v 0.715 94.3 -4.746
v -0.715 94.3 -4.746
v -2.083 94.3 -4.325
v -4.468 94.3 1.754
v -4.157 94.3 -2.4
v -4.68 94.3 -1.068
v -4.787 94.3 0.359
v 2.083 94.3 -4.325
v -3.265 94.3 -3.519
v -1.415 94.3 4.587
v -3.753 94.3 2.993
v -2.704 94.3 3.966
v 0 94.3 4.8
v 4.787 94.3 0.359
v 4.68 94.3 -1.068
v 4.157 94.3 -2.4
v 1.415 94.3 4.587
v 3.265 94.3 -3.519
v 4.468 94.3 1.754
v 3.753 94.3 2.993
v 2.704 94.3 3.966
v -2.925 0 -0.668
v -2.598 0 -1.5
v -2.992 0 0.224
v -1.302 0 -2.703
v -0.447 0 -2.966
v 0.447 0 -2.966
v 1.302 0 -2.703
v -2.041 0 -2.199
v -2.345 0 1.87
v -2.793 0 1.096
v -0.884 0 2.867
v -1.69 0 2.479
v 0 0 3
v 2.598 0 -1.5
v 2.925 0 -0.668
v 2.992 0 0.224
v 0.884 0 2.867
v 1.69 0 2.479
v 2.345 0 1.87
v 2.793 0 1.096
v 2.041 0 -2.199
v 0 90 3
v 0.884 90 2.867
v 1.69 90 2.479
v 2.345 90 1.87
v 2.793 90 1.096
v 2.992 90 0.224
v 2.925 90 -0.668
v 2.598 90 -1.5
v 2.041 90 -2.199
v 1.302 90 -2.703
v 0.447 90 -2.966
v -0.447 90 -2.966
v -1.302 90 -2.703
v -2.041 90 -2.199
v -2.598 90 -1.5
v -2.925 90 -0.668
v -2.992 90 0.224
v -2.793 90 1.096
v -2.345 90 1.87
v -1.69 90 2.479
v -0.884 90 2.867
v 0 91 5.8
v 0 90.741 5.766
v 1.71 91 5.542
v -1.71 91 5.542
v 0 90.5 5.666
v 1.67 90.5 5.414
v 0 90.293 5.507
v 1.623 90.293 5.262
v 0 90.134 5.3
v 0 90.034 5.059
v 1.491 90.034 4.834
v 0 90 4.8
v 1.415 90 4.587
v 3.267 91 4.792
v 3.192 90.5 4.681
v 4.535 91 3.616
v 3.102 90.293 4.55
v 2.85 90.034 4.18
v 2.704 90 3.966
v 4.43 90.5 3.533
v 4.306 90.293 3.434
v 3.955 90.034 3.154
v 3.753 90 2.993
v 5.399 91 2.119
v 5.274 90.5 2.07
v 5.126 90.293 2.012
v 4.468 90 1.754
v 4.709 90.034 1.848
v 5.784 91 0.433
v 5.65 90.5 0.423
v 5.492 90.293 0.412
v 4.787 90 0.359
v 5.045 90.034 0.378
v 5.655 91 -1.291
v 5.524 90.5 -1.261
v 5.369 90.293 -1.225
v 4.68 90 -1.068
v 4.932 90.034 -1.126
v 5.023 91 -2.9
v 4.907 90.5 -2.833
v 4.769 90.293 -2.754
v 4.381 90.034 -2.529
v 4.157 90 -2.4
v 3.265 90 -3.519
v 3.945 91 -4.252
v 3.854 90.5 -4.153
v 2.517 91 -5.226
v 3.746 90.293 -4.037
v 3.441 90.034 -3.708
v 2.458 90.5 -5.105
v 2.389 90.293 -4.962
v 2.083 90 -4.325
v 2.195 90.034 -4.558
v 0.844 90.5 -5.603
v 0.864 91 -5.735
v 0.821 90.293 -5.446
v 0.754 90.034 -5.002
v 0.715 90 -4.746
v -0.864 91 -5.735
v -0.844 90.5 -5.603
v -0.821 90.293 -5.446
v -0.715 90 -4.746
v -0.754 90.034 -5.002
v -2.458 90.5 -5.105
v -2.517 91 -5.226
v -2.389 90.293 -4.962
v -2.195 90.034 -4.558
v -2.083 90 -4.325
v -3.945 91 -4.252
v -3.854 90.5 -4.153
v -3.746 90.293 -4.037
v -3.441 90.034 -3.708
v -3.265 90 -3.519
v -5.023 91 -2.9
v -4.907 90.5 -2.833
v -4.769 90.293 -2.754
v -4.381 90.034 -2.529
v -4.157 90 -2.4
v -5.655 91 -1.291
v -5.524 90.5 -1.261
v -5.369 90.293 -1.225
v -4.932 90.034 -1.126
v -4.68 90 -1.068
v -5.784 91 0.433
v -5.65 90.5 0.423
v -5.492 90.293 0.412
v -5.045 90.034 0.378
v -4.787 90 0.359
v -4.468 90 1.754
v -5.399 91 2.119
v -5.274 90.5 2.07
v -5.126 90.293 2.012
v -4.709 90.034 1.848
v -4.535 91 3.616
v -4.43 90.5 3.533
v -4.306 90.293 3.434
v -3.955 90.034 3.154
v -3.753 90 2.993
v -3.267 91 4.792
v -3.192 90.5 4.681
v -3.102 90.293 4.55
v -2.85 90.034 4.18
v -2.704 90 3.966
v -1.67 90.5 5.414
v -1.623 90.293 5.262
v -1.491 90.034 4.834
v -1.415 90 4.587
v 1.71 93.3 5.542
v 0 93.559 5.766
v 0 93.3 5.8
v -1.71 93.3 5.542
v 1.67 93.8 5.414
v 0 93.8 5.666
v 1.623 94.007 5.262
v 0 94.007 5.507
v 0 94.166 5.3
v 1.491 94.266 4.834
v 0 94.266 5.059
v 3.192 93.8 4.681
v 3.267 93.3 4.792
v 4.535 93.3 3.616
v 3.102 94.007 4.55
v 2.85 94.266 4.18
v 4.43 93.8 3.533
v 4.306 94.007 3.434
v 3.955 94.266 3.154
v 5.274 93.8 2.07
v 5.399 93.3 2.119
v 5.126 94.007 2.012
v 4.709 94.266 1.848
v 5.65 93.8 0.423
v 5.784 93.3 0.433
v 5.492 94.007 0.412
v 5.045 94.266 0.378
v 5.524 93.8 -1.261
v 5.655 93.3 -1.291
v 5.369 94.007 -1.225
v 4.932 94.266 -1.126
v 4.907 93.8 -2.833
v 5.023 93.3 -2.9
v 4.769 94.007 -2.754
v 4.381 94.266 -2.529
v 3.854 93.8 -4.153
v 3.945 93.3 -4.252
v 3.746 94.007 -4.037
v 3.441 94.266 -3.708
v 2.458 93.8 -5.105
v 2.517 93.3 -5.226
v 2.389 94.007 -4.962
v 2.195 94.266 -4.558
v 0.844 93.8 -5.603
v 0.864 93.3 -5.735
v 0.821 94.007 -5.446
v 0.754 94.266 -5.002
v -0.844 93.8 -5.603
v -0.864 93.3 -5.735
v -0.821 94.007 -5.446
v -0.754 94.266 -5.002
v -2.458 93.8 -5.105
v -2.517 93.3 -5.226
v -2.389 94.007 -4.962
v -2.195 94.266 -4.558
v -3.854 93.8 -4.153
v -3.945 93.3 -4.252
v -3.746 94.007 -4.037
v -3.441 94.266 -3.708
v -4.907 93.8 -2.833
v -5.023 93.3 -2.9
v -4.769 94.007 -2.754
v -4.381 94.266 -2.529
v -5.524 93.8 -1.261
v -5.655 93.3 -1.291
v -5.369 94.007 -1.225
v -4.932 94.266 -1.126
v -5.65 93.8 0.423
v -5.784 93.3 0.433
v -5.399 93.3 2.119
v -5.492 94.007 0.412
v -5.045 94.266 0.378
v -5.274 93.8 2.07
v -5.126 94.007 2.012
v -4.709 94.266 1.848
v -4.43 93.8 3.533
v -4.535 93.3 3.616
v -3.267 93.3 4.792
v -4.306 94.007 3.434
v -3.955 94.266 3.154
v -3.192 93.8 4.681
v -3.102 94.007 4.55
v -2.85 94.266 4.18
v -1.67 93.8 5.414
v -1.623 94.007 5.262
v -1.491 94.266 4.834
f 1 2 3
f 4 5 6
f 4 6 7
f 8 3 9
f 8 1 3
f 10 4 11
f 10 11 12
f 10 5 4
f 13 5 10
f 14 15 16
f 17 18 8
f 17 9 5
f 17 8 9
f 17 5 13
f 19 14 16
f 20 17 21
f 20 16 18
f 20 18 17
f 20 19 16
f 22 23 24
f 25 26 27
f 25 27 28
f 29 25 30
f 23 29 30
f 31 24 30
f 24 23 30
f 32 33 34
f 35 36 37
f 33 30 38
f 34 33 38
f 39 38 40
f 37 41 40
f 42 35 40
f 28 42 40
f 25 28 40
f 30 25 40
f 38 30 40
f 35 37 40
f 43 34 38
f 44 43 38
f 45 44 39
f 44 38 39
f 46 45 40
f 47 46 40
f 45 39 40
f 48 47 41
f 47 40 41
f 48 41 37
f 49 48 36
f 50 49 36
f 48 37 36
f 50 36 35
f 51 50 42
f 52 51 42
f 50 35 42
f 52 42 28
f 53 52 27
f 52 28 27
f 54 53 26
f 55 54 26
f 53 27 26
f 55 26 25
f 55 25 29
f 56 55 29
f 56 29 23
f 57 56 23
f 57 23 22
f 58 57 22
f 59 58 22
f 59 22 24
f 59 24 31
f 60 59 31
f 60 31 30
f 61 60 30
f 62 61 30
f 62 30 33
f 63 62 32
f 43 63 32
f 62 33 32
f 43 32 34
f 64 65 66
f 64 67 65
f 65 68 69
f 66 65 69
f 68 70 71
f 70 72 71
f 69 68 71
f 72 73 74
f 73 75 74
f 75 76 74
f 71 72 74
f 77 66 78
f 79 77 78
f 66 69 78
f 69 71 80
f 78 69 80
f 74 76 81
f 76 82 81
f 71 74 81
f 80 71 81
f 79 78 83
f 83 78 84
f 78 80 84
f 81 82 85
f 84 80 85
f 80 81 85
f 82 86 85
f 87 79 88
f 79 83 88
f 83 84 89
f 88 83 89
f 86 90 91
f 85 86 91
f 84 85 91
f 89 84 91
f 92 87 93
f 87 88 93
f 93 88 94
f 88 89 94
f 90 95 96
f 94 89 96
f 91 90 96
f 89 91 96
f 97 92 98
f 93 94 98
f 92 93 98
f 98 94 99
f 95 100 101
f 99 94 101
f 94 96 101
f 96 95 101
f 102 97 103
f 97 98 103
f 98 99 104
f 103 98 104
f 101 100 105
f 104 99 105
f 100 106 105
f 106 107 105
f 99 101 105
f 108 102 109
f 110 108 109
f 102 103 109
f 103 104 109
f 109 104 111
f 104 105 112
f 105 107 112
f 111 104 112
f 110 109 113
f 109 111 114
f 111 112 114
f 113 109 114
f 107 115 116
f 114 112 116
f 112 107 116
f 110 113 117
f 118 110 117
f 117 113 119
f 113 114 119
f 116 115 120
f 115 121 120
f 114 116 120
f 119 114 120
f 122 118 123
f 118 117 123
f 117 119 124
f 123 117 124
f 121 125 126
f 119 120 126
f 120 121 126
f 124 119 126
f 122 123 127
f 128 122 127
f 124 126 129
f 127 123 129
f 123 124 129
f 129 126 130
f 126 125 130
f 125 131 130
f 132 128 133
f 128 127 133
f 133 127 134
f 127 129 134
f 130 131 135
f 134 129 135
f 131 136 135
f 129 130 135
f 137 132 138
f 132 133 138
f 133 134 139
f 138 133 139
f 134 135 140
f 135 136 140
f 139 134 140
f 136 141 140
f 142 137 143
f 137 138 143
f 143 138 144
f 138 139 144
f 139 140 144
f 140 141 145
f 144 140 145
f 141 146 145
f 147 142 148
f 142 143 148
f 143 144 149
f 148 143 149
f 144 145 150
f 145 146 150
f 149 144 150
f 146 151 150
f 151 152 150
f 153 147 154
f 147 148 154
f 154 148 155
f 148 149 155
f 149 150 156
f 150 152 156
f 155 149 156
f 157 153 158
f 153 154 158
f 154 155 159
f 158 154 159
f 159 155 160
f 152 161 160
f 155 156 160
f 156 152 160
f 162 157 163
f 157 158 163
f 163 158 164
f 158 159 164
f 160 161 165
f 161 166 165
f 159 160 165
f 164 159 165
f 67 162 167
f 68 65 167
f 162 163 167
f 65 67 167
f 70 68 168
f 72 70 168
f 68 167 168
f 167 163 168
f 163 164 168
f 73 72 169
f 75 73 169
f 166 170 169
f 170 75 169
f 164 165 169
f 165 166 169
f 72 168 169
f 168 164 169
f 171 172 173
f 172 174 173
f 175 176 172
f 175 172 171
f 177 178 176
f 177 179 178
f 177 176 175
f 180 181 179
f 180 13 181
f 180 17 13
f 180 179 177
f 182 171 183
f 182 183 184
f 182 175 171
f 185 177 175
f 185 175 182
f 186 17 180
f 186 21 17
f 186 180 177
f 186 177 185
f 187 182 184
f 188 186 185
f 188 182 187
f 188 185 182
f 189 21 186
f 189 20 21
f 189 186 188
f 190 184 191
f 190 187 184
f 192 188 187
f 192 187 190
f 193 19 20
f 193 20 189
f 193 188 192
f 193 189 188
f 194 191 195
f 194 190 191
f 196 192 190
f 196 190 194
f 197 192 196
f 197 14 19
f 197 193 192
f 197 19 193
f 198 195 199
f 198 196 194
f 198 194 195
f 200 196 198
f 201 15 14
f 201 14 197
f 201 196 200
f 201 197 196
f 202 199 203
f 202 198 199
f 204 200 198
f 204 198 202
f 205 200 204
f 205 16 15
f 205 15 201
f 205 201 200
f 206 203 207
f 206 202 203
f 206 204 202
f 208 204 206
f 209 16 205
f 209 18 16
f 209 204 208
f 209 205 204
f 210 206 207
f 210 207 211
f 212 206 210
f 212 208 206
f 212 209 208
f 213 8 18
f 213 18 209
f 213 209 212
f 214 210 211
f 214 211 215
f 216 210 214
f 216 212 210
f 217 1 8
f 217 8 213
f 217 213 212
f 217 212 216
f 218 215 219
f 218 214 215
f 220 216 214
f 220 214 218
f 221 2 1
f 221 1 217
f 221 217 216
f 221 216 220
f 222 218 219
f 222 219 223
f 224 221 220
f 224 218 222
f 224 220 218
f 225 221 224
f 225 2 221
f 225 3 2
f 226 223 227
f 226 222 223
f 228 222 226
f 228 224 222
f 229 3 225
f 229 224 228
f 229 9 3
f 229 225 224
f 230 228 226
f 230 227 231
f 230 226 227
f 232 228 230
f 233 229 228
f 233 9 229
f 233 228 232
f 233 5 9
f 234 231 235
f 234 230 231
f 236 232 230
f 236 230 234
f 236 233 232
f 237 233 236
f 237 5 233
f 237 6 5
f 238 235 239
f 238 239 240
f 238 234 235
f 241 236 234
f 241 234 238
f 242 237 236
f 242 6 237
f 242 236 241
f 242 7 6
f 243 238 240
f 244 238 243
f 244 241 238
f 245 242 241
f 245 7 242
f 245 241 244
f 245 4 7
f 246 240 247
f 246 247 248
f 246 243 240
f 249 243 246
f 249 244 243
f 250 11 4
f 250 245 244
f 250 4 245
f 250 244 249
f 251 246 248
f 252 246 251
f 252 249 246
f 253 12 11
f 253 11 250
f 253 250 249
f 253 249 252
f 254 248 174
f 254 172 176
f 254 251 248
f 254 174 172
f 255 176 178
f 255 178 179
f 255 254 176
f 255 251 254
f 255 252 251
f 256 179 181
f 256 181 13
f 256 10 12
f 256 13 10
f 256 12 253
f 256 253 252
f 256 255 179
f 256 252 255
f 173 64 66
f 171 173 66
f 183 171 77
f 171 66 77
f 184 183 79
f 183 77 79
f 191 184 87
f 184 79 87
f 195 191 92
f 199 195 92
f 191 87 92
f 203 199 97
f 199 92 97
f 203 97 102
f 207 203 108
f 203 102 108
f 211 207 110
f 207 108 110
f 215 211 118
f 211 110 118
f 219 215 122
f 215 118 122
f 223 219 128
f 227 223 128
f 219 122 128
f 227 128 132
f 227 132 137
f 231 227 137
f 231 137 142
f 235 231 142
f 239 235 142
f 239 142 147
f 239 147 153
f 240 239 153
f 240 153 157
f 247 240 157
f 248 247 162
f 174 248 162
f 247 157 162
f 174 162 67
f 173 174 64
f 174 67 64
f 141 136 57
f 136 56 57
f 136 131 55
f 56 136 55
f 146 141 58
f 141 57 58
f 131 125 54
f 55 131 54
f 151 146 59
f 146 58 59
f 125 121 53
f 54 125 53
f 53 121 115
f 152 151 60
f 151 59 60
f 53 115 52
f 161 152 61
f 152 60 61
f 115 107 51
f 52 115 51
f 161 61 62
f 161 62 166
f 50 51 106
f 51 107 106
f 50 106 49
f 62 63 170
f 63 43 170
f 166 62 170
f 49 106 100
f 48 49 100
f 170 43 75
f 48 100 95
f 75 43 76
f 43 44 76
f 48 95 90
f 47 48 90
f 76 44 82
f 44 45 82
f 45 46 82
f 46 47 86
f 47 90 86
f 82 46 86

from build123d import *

# Parameters (mm, degrees)
SKETCH1_R           = 3
BOSS_EXTRUDE1_DEPTH = 90
SKETCH2_R           = 5.8
BOSS_EXTRUDE2_DEPTH = 4.3
FILLET1_R           = 1


with BuildPart() as part:
    # Sketch1 → Boss-Extrude1 (new body)
    with BuildSketch(Plane(origin=(0, 0, 0), x_dir=(1, 0, 0), z_dir=(0, 1, 0))):
        with Locations(Location((0, 0, 0), (0, 0, 270))):  # turned: the seam where the file's is
            Circle(SKETCH1_R)
    extrude(amount=BOSS_EXTRUDE1_DEPTH)

    # Sketch2 → Boss-Extrude2 (add)
    with BuildSketch(Plane(origin=(0, 90, 0), x_dir=(1, 0, 0), z_dir=(0, 1, 0))):
        with Locations(Location((0, 0, 0), (0, 0, 270))):  # turned: the seam where the file's is
            Circle(SKETCH2_R)
    extrude(amount=BOSS_EXTRUDE2_DEPTH)

    # Fillet1
    fillet1_edges = [part.edges().sort_by_distance(p)[0] for p in [
        (0, 90, -5.8),
        (0, 94.3, -5.8),
    ]]
    fillet(fillet1_edges, radius=FILLET1_R)


solid = part.part
